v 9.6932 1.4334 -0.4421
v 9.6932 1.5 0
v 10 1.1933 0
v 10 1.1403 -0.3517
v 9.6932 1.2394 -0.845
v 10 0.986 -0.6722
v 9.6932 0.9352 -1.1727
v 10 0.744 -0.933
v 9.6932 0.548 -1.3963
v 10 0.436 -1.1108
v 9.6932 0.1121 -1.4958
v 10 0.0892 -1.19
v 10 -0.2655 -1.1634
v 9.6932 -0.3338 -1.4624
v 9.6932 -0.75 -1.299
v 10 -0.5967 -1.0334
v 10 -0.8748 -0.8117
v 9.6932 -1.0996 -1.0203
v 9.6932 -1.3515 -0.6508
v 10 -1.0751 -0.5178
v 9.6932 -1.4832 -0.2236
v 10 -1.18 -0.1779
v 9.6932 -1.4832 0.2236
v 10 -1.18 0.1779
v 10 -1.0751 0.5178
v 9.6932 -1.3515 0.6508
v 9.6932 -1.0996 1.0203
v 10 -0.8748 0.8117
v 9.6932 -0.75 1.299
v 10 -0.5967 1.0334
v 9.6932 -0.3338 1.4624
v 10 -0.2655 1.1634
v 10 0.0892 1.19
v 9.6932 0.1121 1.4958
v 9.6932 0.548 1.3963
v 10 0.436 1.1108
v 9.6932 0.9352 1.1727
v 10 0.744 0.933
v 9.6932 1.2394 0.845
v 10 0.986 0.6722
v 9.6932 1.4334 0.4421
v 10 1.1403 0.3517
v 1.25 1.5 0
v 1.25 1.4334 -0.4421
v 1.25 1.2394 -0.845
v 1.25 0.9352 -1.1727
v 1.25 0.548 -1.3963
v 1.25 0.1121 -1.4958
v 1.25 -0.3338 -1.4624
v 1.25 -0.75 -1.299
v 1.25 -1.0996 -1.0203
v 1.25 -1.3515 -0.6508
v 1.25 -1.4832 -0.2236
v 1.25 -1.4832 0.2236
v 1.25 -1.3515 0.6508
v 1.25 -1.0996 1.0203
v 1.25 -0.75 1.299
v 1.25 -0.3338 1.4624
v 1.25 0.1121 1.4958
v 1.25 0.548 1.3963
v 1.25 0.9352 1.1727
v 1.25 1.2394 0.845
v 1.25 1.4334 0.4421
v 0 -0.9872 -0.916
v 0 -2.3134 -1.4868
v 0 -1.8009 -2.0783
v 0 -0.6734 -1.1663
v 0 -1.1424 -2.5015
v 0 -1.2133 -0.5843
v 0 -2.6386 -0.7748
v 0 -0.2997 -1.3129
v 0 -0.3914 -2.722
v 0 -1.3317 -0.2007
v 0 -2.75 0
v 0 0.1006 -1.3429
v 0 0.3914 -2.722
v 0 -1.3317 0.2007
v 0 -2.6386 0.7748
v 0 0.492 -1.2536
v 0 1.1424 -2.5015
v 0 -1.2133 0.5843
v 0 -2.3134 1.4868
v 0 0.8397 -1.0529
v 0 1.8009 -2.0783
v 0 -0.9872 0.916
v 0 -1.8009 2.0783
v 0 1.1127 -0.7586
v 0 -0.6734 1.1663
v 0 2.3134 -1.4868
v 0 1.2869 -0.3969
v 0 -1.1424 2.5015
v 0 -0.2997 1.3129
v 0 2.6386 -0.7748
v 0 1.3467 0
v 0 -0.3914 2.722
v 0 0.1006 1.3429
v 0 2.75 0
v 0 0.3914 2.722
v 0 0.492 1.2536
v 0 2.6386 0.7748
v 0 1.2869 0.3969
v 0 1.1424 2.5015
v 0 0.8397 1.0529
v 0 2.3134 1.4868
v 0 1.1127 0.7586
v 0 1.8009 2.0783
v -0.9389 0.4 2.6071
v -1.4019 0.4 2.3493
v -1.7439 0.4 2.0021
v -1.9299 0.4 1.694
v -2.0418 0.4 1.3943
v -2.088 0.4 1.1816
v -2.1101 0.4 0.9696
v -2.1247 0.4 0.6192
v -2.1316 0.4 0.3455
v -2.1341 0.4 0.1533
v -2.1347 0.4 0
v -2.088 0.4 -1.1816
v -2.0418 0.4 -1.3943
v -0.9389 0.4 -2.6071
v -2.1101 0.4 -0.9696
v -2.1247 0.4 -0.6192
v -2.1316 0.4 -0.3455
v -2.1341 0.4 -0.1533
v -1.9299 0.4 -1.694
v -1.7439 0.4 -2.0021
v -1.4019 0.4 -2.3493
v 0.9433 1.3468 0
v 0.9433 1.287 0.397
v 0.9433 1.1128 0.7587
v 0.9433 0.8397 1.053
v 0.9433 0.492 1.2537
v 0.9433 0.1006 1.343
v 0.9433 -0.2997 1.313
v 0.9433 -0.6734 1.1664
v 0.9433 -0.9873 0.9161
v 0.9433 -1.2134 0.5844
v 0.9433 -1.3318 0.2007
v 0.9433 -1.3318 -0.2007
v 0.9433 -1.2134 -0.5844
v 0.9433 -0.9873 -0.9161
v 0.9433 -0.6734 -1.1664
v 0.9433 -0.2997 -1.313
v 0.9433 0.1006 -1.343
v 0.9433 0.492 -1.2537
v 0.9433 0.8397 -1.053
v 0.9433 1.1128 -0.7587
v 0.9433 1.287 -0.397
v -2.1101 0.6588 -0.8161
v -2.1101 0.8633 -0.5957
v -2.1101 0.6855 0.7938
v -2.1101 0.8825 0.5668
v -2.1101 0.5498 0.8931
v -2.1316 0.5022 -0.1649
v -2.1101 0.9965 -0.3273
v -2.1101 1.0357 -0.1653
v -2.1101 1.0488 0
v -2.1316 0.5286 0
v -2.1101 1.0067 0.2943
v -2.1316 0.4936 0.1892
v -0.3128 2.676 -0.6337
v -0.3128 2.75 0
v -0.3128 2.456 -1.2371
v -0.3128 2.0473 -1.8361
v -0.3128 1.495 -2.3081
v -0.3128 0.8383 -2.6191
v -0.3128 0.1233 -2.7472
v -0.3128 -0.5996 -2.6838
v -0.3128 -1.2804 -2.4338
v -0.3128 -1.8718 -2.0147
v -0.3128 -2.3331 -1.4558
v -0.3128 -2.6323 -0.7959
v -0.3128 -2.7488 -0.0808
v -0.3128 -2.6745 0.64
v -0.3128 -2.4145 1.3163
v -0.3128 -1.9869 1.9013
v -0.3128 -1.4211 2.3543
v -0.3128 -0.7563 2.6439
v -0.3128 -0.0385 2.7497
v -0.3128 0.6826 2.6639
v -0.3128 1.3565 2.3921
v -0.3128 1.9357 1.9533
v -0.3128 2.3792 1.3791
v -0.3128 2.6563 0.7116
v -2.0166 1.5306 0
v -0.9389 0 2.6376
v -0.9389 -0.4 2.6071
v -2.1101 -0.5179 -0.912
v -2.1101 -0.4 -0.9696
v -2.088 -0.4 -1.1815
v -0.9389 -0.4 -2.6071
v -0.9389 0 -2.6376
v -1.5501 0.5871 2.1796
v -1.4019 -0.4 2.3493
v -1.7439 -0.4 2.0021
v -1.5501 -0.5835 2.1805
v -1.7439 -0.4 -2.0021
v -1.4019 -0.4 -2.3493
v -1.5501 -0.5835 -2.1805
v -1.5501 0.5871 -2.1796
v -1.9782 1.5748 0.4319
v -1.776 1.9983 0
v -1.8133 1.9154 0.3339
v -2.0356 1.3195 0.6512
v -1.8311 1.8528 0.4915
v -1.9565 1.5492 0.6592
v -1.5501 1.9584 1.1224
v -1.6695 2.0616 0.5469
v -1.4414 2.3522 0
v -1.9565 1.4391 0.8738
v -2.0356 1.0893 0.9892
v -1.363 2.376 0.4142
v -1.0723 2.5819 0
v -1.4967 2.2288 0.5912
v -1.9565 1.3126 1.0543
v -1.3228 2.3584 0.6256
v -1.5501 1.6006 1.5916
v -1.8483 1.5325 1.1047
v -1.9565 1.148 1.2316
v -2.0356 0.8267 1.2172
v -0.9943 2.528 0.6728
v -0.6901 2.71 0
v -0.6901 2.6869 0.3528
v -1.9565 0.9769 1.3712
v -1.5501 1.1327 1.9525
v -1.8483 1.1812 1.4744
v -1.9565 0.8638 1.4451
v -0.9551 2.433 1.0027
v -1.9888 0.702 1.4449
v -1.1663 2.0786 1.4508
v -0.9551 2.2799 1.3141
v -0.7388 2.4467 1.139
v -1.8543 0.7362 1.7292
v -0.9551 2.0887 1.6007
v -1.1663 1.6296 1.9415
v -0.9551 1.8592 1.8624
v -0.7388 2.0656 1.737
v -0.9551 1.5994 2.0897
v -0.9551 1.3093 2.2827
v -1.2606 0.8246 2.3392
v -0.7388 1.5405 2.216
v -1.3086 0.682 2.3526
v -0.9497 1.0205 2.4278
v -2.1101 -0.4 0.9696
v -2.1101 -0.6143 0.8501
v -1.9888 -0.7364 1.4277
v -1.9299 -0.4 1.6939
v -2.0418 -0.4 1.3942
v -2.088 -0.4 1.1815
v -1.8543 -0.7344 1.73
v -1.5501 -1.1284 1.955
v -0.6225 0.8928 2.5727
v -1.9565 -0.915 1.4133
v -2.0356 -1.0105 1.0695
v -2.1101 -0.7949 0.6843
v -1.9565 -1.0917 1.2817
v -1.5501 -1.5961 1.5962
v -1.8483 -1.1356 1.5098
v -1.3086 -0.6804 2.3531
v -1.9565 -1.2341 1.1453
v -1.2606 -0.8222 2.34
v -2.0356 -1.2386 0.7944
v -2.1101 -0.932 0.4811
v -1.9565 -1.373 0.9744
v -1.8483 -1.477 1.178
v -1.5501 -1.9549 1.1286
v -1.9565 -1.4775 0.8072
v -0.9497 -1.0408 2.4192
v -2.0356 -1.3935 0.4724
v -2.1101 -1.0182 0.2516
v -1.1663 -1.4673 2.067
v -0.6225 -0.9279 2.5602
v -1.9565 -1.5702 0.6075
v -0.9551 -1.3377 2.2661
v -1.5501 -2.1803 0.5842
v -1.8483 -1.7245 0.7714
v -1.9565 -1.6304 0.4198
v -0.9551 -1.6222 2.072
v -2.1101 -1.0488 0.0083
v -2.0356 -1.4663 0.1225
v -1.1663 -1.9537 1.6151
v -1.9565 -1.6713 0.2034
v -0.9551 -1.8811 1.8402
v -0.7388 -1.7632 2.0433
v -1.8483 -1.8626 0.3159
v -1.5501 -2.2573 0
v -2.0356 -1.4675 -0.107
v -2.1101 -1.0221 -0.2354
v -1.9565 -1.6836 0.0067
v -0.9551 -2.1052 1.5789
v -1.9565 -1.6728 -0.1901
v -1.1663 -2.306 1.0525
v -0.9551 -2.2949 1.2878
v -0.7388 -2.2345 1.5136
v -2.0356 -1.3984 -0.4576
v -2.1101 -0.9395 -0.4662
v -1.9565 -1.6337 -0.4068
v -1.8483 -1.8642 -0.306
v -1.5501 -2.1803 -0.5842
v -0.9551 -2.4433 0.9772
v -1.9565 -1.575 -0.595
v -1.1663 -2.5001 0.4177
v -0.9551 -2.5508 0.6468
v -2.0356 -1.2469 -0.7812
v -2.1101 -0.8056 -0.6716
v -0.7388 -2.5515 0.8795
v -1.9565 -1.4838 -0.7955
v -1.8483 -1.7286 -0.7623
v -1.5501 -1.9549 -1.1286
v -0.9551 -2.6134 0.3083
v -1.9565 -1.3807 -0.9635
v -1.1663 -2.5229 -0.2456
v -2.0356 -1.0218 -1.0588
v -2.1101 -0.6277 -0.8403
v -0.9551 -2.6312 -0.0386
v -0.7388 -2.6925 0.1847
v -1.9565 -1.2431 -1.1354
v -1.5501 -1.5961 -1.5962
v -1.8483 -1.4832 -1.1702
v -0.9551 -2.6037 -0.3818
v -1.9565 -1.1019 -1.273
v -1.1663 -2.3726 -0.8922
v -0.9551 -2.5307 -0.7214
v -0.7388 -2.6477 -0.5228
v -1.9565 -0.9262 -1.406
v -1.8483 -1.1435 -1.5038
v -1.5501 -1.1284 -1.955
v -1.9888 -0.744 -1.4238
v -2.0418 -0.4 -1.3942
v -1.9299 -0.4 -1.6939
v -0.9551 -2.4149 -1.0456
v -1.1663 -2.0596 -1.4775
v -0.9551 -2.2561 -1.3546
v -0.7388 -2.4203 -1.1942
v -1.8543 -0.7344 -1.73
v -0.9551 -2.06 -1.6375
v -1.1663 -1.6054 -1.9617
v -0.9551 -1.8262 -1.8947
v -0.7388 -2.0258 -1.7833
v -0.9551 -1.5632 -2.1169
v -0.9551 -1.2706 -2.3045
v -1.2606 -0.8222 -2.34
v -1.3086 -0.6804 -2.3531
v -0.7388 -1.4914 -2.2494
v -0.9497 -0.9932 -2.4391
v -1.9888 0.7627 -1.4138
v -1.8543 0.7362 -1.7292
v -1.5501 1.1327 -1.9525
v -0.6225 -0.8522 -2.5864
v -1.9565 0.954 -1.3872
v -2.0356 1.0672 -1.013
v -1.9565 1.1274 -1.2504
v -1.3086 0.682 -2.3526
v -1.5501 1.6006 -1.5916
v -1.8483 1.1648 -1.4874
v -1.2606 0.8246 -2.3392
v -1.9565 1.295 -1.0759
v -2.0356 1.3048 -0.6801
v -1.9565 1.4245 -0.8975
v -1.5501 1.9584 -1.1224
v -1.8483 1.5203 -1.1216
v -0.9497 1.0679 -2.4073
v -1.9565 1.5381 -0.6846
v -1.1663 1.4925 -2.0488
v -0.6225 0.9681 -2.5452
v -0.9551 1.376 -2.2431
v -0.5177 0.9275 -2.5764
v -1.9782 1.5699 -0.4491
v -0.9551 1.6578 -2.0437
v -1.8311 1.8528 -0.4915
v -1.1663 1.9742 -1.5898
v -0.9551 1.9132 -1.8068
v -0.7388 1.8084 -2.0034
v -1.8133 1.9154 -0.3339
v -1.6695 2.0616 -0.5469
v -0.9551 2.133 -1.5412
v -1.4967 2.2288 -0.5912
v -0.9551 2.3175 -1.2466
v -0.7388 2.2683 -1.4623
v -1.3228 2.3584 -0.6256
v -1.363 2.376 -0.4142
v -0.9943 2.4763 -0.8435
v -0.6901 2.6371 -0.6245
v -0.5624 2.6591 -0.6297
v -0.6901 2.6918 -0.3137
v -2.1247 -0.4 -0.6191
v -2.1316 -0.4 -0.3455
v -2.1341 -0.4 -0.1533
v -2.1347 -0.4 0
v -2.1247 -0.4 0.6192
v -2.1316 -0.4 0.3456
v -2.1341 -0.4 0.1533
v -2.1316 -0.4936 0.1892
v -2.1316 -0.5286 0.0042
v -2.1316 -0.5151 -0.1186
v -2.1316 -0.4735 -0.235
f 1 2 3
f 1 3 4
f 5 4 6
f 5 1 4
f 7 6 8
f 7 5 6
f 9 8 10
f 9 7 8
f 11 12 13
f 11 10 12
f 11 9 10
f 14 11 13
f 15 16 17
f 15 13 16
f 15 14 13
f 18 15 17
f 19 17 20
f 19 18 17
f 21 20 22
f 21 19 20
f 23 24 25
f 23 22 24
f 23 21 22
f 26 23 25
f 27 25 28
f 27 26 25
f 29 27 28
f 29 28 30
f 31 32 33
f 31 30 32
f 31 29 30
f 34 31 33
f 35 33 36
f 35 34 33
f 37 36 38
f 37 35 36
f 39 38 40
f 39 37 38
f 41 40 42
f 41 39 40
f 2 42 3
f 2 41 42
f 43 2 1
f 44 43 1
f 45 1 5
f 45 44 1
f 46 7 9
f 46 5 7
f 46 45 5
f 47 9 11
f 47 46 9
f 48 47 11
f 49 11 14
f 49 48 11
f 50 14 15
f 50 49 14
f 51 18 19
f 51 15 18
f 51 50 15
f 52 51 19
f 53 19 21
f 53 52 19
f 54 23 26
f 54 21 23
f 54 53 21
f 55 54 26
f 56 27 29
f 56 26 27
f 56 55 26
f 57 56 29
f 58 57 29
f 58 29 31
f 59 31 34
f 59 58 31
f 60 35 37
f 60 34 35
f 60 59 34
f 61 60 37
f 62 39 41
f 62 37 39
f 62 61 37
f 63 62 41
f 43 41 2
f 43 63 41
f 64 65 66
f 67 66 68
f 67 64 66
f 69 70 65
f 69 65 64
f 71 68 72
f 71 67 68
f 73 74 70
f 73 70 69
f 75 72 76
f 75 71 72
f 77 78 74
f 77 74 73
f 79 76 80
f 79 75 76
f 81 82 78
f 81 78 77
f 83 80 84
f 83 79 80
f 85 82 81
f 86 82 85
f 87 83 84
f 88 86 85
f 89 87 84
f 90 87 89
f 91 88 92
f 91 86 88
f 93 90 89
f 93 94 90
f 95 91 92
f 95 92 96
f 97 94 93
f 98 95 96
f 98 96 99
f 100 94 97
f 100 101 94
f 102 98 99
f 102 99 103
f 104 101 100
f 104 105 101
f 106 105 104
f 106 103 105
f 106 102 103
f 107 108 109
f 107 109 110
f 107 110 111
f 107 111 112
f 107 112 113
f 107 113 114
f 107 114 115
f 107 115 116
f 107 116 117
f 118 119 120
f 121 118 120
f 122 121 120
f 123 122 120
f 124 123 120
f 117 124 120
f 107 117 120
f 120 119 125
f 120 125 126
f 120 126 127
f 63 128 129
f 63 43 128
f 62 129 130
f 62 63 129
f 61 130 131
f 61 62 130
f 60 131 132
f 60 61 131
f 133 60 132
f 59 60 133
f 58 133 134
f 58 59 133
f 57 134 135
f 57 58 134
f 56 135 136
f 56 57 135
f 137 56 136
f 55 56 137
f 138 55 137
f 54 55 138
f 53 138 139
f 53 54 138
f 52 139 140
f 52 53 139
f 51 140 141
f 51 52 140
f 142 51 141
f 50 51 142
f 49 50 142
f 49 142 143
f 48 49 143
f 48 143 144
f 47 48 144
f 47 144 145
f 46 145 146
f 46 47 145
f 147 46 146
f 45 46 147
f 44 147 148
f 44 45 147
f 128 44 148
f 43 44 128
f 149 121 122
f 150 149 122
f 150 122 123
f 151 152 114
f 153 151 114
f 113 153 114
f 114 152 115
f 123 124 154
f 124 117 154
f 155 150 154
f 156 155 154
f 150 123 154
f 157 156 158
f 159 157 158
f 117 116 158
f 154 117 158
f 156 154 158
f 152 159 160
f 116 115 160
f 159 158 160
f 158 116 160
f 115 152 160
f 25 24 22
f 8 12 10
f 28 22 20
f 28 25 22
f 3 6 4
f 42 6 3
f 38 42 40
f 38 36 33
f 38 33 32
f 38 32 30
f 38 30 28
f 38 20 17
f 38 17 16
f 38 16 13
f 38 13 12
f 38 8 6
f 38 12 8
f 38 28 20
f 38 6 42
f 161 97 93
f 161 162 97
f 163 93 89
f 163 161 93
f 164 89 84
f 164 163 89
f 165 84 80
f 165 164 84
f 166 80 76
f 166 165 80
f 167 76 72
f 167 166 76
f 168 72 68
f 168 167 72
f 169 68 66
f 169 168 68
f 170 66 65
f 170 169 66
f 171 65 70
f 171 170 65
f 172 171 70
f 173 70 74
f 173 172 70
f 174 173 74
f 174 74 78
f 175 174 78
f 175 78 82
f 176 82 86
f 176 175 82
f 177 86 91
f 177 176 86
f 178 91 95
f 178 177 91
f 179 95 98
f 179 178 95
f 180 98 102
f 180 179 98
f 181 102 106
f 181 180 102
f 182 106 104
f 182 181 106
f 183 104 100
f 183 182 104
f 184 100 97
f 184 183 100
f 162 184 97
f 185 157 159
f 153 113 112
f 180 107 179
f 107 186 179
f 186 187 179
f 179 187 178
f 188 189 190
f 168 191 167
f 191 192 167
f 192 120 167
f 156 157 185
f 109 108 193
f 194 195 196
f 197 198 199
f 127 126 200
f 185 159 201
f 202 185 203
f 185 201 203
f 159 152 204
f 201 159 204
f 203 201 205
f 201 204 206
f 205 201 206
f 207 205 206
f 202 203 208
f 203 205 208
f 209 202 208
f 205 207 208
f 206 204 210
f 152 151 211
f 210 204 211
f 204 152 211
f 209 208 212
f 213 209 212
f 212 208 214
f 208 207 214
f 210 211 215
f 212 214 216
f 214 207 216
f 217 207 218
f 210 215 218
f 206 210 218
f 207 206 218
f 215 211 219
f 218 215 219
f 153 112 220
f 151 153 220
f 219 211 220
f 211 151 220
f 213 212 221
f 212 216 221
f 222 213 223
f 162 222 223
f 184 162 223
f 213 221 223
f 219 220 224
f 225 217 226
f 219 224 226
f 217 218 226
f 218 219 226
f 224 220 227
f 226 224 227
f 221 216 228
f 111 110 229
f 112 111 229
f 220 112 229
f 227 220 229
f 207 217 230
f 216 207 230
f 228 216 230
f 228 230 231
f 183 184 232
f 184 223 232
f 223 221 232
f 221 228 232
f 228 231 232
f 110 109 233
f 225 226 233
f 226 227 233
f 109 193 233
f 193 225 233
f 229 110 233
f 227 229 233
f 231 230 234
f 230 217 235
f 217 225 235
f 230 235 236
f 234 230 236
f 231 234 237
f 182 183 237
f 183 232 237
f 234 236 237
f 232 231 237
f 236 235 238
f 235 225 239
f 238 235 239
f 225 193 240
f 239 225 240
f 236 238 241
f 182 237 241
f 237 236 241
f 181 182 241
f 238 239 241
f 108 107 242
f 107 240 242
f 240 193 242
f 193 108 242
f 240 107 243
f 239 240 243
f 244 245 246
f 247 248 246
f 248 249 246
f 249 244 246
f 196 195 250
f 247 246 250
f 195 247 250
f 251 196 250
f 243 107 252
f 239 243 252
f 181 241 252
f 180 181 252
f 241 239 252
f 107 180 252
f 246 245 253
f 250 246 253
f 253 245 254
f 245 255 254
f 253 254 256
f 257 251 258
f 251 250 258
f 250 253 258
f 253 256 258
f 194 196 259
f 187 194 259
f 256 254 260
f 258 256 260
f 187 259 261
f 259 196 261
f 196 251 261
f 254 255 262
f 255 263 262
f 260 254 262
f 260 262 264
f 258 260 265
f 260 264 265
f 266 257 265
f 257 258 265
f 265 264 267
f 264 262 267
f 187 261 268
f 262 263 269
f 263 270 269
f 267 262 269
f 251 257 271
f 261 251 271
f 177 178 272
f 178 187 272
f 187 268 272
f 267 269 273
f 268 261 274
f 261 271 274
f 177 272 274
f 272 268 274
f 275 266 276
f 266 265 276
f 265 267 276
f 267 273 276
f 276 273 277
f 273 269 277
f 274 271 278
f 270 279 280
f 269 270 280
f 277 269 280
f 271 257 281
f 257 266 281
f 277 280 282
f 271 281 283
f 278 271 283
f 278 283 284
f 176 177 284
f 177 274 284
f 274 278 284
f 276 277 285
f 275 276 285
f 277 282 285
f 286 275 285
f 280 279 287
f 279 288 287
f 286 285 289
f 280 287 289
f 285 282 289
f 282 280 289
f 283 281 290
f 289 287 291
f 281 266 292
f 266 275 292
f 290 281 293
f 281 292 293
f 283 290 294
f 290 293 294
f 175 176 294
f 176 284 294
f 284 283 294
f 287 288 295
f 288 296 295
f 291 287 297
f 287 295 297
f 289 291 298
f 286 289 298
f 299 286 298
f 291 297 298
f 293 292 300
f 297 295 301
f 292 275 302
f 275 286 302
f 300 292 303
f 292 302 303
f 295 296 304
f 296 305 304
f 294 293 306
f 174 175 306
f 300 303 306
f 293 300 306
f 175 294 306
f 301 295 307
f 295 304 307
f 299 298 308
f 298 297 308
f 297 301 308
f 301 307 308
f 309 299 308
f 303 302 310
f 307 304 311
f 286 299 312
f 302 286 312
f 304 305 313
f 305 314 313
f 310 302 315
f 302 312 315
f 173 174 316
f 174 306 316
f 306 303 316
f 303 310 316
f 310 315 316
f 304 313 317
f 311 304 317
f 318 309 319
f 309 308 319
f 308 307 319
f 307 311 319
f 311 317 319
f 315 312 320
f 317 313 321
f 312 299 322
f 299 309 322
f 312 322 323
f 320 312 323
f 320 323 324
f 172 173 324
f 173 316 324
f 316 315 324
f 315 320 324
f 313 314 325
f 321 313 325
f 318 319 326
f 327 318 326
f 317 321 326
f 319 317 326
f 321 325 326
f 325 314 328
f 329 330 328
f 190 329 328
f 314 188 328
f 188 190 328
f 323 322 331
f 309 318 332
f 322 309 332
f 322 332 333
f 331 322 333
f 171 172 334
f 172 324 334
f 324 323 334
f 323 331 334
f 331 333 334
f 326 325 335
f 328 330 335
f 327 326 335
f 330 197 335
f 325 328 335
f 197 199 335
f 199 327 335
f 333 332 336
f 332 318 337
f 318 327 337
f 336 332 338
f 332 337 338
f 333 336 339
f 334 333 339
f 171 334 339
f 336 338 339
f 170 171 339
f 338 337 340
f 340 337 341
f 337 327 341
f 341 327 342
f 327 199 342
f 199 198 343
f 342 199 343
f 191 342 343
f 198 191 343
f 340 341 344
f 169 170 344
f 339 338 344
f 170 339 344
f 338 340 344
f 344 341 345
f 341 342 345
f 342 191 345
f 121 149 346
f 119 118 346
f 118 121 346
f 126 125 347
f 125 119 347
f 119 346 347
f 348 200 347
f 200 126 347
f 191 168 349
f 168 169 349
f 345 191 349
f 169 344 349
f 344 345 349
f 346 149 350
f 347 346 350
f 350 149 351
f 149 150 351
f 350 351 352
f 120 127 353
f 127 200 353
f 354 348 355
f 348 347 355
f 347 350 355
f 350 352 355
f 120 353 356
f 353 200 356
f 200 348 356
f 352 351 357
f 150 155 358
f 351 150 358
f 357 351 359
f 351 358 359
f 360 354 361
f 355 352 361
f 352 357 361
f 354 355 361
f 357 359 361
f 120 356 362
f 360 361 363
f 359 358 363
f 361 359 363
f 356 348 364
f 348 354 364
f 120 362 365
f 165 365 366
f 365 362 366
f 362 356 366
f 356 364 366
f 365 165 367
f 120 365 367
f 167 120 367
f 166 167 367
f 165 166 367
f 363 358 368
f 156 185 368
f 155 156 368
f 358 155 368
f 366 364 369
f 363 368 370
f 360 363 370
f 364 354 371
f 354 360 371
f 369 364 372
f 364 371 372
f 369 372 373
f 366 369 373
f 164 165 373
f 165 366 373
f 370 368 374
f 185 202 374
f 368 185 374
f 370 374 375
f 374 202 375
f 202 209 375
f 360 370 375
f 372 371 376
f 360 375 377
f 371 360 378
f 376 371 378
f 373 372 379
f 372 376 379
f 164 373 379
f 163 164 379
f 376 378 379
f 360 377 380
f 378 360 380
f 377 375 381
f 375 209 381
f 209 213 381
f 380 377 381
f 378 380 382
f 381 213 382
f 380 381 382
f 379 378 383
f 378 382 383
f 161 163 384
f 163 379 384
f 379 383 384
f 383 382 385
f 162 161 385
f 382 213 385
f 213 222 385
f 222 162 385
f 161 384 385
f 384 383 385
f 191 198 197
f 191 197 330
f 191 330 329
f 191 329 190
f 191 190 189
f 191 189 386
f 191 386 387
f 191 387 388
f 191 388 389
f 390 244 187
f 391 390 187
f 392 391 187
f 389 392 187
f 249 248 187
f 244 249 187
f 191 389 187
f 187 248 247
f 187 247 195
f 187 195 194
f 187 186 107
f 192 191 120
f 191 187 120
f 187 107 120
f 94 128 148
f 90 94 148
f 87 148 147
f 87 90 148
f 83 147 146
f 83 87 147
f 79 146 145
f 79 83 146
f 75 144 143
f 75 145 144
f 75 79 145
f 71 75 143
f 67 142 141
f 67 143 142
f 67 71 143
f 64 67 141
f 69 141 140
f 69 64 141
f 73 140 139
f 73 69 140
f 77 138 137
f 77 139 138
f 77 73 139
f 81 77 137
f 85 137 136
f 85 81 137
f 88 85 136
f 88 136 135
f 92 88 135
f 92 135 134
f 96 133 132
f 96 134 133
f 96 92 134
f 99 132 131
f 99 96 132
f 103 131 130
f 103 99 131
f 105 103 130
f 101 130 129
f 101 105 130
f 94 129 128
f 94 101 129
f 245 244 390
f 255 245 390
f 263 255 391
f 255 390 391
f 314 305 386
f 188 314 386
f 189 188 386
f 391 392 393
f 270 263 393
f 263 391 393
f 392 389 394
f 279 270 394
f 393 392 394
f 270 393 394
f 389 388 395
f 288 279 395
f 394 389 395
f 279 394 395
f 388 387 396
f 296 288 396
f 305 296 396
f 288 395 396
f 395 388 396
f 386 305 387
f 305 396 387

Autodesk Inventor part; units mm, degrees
ref_plane "YZ Plane" through (0, 0, 0) normal (1, 0, 0) x (0, 1, 0)
sketch "Skizze1" plane through (0, 0, 0) normal (0, 0, 1) x (1, 0, 0)
  line L0 (-2.1389, 0) -> (10, 0)
  line L1 (10, 0) -> (10, 1.5)
  line L2 (10, 1.5) -> (1.25, 1.5)
  line L3 (1.25, 1.5) -> (0.9433, 1.3468)
  line L4 (0.9433, 1.3468) -> (0, 1.3467)
  line L5 (0, 1.3467) -> (0, 2.75)
  line L6 (-6.0203, 0) -> (20.8022, 0) projected
  line L7 (0, -0.5507) -> (0, 3.3039) projected
  line L8 (0, 2.75) -> (-1.94, 2.7497)
  arc A0 (-1.94, 2.7497) -> (-2.1389, 0) centre (16.9704, 0) ccw
  dimension "d0" = 10
  dimension "d1" = 8.75
  dimension "d2" = 0.3067
  dimension "d3" = 2.1389
  dimension "d4" = 3
  dimension "d5" = 2.6935
  dimension "d9" = 5.5
  dimension "d10" = 0.01
  dimension "d15" = 19.1093
revolve "Körper" add sketch "Skizze1" angle 360 about axis through (-2.1389, 0, 0) along (1, 0, 0)
fillet "Rundung1" radius 1.8 1 edges at (-1.94, -2.7497, 0)
ref_plane "IDS_WORKPLANE{1}" through (-2.1389, 0, 0) normal (1, 0, 0) x (0, 0, -1)
sketch "Skizze2" plane through (-2.1389, 0, 0) normal (1, 0, 0) x (0, 0, -1)
  line L0 (0, -3.85) -> (0, 3.85) projected
  line L1 (3.85, 0) -> (-3.85, 0) projected
  line L2 (-2.75, 0.4) -> (2.75, 0.4)
  line L3 (2.75, 0.4) -> (2.75, -0.4)
  line L4 (2.75, -0.4) -> (-2.75, -0.4)
  line L5 (-2.75, -0.4) -> (-2.75, 0.4)
  line L6 (0, 0.4) -> (0, -0.4) construction
  line L7 (-2.75, 0) -> (2.75, 0) construction
  circle A0 centre (0, 0) radius 2.75 projected
  dimension "d17" = 0.8
extrude "Loch" cut sketch "Skizze2" along normal blind 1.2 contours L4 A0 L1 L0 | L0 L1 A0 L4 | L4 L5 A0 | A0 L3 L4 | L1 A0 L2 L0 | L0 L2 A0 L1 | L5 L2 A0 | A0 L2 L3
thread "Gewinde" size "M3x0.5" class "6g" standard "ISO Metric profile" length 8.75
chamfer "Fase1" distance 0.3067 distance2 0.3068 1 edges at (10, -1.5, 0) measured on face at (10, 0.417, 0.2189)
ref_plane "Work Plane2" through (8.25, 0, 0) normal (0, 0, -1) x (1, 0, 0)
equation "\"d0\" = NLG"
equation "\"d1\" = GEL"
equation "\"d2\" = GAL"
equation "\"d3\" = KOH"
equation "\"d4\" = GD"
equation "\"d5\" = BDM"
equation "\"d9\" = KOD"
equation "\"d10\" = KEWI"
equation "\"d17\" = SBR"
equation "\"d18\" = STI"
equation "\"d20\" = RR"
equation "\"d11\" = GEL"
equation "\"d13\" = -0.5 * SPD + 0.5 * GD"
equation "\"GD\" = NND"
equation "\"NLG\" = 10"
equation "\"GEL\" = 8.75"
equation "\"KOD\" = 5.5"
equation "\"KOH\" = 2.13889"
equation "\"GAL\" = 0.61345 * PTC"
equation "\"SPD\" = NND - 1.2269 * PTC"
equation "\"BDM\" = 2.6935"
equation "\"GUL\" = 0.61345 * PTC"
equation "\"RR\" = 1.8"
equation "\"SBR\" = 0.8"
equation "\"STI\" = 1.2"
equation "\"KEWI\" = 0.01deg"
equation "\"KR\" = 3.3"
equation "\"d16\" = -KOH"
equation "\"PTC\" = 0.5"
equation "\"THREADDIA\" = 3"
equation "\"TOA\" = 30deg"
equation "\"NND\" = 3"
equation "\"ORI\" = 1.8"
equation "\"GD1\" = THREADDIA - 1.2269 * PTC"
properties part number "CNS 9671 - M3 x 10" material "Steel, Mild"
